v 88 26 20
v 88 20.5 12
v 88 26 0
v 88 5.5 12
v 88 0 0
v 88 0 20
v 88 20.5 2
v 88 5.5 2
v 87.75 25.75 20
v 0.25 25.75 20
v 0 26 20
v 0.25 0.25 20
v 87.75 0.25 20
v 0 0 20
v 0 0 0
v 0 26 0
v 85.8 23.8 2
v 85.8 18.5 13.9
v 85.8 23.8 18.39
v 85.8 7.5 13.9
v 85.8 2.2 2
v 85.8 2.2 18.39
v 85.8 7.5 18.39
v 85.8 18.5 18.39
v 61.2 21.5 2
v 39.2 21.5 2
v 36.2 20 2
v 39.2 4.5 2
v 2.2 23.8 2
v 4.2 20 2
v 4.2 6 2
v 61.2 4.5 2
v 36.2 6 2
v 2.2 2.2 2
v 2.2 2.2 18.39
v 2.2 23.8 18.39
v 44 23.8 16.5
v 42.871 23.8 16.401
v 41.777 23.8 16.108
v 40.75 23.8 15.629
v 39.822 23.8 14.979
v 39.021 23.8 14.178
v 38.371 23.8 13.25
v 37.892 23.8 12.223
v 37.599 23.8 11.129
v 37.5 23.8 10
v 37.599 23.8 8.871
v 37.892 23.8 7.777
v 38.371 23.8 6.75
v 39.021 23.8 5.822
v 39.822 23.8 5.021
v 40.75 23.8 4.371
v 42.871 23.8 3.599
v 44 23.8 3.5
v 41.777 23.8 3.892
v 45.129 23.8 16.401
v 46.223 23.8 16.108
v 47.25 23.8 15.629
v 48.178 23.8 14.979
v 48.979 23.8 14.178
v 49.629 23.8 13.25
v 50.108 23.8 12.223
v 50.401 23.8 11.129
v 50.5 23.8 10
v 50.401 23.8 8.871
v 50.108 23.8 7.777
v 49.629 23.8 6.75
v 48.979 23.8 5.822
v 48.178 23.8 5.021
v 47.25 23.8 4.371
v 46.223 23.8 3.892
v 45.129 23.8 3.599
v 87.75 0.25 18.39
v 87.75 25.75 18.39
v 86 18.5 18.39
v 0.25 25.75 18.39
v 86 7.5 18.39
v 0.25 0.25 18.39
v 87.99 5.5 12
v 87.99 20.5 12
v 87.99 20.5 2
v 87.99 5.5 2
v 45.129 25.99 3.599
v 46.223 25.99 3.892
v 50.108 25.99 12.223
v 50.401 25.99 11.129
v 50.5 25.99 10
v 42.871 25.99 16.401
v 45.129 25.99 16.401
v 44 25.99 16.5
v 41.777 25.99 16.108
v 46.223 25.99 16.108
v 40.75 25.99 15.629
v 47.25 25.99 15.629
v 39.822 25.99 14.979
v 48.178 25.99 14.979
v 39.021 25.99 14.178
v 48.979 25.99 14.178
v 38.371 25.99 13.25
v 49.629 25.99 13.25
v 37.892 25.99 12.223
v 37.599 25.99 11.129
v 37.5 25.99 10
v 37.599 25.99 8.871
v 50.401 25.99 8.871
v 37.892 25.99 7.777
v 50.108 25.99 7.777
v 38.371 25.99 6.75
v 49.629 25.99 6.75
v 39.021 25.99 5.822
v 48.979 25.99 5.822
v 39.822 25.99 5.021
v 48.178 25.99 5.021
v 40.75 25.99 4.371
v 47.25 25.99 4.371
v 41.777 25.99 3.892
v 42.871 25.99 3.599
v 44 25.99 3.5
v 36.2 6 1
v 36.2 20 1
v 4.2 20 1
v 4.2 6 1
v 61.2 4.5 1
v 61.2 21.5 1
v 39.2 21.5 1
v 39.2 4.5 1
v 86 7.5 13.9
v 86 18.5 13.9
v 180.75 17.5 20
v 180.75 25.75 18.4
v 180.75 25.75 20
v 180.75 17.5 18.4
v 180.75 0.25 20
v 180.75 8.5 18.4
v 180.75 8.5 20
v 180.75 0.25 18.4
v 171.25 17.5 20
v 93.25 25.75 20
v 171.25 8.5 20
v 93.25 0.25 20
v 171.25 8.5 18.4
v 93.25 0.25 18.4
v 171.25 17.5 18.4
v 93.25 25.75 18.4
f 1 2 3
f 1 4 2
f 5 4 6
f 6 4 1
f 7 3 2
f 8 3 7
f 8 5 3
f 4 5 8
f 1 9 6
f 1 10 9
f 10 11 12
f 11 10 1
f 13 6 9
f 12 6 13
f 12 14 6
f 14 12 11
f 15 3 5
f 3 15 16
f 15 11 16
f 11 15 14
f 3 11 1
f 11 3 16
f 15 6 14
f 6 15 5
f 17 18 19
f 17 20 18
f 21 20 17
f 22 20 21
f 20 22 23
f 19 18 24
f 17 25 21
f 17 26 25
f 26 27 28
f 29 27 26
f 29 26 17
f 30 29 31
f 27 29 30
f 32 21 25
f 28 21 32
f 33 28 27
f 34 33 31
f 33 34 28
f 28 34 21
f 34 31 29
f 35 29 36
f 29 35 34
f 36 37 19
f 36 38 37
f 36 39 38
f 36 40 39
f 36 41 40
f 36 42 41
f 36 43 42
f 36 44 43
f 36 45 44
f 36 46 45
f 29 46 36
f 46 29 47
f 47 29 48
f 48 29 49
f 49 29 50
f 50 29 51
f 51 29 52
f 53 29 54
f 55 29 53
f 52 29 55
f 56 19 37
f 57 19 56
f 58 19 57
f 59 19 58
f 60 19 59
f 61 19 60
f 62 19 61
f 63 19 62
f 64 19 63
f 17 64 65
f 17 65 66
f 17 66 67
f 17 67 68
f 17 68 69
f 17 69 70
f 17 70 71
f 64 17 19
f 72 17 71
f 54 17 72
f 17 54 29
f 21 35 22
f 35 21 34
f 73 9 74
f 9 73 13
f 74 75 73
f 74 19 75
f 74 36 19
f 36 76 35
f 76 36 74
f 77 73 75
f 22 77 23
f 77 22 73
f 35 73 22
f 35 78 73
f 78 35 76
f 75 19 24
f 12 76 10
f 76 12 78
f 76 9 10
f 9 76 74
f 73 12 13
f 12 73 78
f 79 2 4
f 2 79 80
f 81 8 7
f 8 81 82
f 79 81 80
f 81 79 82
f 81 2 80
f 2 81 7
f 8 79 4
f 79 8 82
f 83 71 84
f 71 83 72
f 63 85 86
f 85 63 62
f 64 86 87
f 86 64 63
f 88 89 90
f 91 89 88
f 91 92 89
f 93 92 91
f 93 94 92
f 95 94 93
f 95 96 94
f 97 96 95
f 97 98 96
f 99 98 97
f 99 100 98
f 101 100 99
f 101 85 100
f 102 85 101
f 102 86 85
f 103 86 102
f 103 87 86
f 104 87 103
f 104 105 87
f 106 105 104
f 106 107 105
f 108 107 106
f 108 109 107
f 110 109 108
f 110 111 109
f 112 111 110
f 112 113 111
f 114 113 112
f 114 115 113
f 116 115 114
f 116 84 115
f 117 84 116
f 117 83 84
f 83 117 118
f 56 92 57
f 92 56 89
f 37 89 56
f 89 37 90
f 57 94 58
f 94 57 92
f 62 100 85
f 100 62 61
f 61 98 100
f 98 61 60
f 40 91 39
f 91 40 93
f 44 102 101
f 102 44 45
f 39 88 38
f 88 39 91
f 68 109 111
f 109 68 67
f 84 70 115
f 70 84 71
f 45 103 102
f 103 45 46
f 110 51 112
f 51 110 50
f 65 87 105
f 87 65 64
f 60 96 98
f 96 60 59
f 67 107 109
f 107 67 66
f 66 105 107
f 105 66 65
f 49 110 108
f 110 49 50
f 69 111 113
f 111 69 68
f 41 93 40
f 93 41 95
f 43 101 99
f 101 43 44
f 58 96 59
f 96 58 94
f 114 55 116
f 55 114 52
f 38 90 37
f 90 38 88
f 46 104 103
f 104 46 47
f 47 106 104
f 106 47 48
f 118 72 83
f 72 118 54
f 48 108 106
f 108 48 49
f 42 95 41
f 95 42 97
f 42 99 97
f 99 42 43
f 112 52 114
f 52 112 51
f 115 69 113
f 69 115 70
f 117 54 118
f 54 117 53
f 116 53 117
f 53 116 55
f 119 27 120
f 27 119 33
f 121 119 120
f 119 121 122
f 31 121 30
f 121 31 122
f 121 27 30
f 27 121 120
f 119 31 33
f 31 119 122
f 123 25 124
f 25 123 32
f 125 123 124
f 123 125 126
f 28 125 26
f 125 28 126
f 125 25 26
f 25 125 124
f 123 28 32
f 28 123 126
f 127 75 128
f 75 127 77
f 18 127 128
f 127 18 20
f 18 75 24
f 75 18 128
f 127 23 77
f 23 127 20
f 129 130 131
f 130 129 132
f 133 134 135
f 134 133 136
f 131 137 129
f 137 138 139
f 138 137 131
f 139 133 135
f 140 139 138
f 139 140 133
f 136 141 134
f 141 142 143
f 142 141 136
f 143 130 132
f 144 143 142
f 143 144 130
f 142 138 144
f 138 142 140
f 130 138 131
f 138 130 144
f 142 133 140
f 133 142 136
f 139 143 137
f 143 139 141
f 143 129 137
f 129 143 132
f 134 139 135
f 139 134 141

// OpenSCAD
// Xiao ESP32 S3 Sense Case v2
// Wider, thicker, with battery/IMU/button
// Style: Bryła1 (base) + Bryła2 (sliding lid with camera notch)

/* [Dimensions] */
W = 88;         // overall X (was 65)
H = 26;         // overall Y (was 22)
D = 20;         // overall Z (was 13.4) — thicker for battery
t = 2.2;        // wall thickness
floor = 2.0;    // bottom floor thickness
lid_t = 1.6;    // lid thickness
gap = 0.25;     // lid sliding clearance

/* [Camera Notch] */
cam_w = 9.5;
cam_h = 9.0;

/* [I/O opening on right wall] */
io_w = 15;      // wide enough for USB-C + SD
io_h = 10;
io_z = 7;

/* [Battery 301230] */
bat_w = 32;
bat_h = 14;
bat_d = 6.5;

/* [IMU GY-521] */
imu_w = 22;
imu_h = 17;
imu_d = 5;

/* [Button] */
btn_r = 6.5;    // panel-mount button radius
btn_z = 10;     // Z center of button

/* [Render] */
PART = "both"; // "base" "lid" "both"

// --- Derived ---
iw = W - 2*t;           // interior width
ih = H - 2*t;           // interior height
lid_z = D - lid_t;      // lid Z position
cam_y = H/2 - cam_h/2;  // camera notch Y

// I/O opening Z range
io_z0 = io_z - io_h/2;
io_z1 = io_z + io_h/2;

// Battery position (left side)
bat_x = t + 2;
bat_y = H/2 - bat_h/2;

// IMU position (between battery and Xiao area)
imu_x = bat_x + bat_w + 3;
imu_y = H/2 - imu_h/2;

// ============================================================
// BASE
// ============================================================
module base() {
    difference() {
        // Outer shell
        cube([W, H, D]);

        // Interior cavity
        translate([t, t, floor])
            cube([iw, ih, lid_z - floor + 0.01]);

        // Lid recess on top
        translate([gap, gap, lid_z - 0.01])
            cube([W - 2*gap, H - 2*gap, lid_t + 0.02]);

        // I/O opening — right wall (USB-C + SD)
        translate([W - 0.01, H/2 - io_w/2, io_z0])
            cube([t + 0.02, io_w, io_h]);

        // Button hole — front wall (Y+)
        translate([W/2, H - 0.01, btn_z])
            rotate([90, 0, 0])
            cylinder(r=btn_r, h=t + 0.02, $fn=36);

        // Battery positioning pocket (1mm deep depression in floor)
        translate([bat_x, bat_y, floor - 1.0])
            cube([bat_w, bat_h, 1.0]);

        // IMU positioning pocket (1mm deep depression in floor)
        translate([imu_x, imu_y, floor - 1.0])
            cube([imu_w, imu_h, 1.0]);

        // Camera pass-through (space for camera module under lid notch)
        // Stops short of the exterior wall
        translate([W - cam_w - 3, cam_y - 1, lid_z - 4.5])
            cube([cam_w + 1, cam_h + 2, 4.5 + 0.01]);
    }
}

// ============================================================
// LID  (slides into top recess of base)
// ============================================================
module lid() {
    difference() {
        // Lid body
        translate([gap, gap, lid_z])
            cube([W - 2*gap, H - 2*gap, lid_t]);

        // Camera notch on right edge
        translate([W - gap - cam_w, cam_y, lid_z - 0.01])
            cube([cam_w + gap + 0.01, cam_h, lid_t + 0.02]);
    }
}

// ============================================================
// RENDER
// ============================================================
if (PART == "base" || PART == "both")
    base();

if (PART == "lid" || PART == "both")
    translate([W + 5, 0, 0])
        lid();
